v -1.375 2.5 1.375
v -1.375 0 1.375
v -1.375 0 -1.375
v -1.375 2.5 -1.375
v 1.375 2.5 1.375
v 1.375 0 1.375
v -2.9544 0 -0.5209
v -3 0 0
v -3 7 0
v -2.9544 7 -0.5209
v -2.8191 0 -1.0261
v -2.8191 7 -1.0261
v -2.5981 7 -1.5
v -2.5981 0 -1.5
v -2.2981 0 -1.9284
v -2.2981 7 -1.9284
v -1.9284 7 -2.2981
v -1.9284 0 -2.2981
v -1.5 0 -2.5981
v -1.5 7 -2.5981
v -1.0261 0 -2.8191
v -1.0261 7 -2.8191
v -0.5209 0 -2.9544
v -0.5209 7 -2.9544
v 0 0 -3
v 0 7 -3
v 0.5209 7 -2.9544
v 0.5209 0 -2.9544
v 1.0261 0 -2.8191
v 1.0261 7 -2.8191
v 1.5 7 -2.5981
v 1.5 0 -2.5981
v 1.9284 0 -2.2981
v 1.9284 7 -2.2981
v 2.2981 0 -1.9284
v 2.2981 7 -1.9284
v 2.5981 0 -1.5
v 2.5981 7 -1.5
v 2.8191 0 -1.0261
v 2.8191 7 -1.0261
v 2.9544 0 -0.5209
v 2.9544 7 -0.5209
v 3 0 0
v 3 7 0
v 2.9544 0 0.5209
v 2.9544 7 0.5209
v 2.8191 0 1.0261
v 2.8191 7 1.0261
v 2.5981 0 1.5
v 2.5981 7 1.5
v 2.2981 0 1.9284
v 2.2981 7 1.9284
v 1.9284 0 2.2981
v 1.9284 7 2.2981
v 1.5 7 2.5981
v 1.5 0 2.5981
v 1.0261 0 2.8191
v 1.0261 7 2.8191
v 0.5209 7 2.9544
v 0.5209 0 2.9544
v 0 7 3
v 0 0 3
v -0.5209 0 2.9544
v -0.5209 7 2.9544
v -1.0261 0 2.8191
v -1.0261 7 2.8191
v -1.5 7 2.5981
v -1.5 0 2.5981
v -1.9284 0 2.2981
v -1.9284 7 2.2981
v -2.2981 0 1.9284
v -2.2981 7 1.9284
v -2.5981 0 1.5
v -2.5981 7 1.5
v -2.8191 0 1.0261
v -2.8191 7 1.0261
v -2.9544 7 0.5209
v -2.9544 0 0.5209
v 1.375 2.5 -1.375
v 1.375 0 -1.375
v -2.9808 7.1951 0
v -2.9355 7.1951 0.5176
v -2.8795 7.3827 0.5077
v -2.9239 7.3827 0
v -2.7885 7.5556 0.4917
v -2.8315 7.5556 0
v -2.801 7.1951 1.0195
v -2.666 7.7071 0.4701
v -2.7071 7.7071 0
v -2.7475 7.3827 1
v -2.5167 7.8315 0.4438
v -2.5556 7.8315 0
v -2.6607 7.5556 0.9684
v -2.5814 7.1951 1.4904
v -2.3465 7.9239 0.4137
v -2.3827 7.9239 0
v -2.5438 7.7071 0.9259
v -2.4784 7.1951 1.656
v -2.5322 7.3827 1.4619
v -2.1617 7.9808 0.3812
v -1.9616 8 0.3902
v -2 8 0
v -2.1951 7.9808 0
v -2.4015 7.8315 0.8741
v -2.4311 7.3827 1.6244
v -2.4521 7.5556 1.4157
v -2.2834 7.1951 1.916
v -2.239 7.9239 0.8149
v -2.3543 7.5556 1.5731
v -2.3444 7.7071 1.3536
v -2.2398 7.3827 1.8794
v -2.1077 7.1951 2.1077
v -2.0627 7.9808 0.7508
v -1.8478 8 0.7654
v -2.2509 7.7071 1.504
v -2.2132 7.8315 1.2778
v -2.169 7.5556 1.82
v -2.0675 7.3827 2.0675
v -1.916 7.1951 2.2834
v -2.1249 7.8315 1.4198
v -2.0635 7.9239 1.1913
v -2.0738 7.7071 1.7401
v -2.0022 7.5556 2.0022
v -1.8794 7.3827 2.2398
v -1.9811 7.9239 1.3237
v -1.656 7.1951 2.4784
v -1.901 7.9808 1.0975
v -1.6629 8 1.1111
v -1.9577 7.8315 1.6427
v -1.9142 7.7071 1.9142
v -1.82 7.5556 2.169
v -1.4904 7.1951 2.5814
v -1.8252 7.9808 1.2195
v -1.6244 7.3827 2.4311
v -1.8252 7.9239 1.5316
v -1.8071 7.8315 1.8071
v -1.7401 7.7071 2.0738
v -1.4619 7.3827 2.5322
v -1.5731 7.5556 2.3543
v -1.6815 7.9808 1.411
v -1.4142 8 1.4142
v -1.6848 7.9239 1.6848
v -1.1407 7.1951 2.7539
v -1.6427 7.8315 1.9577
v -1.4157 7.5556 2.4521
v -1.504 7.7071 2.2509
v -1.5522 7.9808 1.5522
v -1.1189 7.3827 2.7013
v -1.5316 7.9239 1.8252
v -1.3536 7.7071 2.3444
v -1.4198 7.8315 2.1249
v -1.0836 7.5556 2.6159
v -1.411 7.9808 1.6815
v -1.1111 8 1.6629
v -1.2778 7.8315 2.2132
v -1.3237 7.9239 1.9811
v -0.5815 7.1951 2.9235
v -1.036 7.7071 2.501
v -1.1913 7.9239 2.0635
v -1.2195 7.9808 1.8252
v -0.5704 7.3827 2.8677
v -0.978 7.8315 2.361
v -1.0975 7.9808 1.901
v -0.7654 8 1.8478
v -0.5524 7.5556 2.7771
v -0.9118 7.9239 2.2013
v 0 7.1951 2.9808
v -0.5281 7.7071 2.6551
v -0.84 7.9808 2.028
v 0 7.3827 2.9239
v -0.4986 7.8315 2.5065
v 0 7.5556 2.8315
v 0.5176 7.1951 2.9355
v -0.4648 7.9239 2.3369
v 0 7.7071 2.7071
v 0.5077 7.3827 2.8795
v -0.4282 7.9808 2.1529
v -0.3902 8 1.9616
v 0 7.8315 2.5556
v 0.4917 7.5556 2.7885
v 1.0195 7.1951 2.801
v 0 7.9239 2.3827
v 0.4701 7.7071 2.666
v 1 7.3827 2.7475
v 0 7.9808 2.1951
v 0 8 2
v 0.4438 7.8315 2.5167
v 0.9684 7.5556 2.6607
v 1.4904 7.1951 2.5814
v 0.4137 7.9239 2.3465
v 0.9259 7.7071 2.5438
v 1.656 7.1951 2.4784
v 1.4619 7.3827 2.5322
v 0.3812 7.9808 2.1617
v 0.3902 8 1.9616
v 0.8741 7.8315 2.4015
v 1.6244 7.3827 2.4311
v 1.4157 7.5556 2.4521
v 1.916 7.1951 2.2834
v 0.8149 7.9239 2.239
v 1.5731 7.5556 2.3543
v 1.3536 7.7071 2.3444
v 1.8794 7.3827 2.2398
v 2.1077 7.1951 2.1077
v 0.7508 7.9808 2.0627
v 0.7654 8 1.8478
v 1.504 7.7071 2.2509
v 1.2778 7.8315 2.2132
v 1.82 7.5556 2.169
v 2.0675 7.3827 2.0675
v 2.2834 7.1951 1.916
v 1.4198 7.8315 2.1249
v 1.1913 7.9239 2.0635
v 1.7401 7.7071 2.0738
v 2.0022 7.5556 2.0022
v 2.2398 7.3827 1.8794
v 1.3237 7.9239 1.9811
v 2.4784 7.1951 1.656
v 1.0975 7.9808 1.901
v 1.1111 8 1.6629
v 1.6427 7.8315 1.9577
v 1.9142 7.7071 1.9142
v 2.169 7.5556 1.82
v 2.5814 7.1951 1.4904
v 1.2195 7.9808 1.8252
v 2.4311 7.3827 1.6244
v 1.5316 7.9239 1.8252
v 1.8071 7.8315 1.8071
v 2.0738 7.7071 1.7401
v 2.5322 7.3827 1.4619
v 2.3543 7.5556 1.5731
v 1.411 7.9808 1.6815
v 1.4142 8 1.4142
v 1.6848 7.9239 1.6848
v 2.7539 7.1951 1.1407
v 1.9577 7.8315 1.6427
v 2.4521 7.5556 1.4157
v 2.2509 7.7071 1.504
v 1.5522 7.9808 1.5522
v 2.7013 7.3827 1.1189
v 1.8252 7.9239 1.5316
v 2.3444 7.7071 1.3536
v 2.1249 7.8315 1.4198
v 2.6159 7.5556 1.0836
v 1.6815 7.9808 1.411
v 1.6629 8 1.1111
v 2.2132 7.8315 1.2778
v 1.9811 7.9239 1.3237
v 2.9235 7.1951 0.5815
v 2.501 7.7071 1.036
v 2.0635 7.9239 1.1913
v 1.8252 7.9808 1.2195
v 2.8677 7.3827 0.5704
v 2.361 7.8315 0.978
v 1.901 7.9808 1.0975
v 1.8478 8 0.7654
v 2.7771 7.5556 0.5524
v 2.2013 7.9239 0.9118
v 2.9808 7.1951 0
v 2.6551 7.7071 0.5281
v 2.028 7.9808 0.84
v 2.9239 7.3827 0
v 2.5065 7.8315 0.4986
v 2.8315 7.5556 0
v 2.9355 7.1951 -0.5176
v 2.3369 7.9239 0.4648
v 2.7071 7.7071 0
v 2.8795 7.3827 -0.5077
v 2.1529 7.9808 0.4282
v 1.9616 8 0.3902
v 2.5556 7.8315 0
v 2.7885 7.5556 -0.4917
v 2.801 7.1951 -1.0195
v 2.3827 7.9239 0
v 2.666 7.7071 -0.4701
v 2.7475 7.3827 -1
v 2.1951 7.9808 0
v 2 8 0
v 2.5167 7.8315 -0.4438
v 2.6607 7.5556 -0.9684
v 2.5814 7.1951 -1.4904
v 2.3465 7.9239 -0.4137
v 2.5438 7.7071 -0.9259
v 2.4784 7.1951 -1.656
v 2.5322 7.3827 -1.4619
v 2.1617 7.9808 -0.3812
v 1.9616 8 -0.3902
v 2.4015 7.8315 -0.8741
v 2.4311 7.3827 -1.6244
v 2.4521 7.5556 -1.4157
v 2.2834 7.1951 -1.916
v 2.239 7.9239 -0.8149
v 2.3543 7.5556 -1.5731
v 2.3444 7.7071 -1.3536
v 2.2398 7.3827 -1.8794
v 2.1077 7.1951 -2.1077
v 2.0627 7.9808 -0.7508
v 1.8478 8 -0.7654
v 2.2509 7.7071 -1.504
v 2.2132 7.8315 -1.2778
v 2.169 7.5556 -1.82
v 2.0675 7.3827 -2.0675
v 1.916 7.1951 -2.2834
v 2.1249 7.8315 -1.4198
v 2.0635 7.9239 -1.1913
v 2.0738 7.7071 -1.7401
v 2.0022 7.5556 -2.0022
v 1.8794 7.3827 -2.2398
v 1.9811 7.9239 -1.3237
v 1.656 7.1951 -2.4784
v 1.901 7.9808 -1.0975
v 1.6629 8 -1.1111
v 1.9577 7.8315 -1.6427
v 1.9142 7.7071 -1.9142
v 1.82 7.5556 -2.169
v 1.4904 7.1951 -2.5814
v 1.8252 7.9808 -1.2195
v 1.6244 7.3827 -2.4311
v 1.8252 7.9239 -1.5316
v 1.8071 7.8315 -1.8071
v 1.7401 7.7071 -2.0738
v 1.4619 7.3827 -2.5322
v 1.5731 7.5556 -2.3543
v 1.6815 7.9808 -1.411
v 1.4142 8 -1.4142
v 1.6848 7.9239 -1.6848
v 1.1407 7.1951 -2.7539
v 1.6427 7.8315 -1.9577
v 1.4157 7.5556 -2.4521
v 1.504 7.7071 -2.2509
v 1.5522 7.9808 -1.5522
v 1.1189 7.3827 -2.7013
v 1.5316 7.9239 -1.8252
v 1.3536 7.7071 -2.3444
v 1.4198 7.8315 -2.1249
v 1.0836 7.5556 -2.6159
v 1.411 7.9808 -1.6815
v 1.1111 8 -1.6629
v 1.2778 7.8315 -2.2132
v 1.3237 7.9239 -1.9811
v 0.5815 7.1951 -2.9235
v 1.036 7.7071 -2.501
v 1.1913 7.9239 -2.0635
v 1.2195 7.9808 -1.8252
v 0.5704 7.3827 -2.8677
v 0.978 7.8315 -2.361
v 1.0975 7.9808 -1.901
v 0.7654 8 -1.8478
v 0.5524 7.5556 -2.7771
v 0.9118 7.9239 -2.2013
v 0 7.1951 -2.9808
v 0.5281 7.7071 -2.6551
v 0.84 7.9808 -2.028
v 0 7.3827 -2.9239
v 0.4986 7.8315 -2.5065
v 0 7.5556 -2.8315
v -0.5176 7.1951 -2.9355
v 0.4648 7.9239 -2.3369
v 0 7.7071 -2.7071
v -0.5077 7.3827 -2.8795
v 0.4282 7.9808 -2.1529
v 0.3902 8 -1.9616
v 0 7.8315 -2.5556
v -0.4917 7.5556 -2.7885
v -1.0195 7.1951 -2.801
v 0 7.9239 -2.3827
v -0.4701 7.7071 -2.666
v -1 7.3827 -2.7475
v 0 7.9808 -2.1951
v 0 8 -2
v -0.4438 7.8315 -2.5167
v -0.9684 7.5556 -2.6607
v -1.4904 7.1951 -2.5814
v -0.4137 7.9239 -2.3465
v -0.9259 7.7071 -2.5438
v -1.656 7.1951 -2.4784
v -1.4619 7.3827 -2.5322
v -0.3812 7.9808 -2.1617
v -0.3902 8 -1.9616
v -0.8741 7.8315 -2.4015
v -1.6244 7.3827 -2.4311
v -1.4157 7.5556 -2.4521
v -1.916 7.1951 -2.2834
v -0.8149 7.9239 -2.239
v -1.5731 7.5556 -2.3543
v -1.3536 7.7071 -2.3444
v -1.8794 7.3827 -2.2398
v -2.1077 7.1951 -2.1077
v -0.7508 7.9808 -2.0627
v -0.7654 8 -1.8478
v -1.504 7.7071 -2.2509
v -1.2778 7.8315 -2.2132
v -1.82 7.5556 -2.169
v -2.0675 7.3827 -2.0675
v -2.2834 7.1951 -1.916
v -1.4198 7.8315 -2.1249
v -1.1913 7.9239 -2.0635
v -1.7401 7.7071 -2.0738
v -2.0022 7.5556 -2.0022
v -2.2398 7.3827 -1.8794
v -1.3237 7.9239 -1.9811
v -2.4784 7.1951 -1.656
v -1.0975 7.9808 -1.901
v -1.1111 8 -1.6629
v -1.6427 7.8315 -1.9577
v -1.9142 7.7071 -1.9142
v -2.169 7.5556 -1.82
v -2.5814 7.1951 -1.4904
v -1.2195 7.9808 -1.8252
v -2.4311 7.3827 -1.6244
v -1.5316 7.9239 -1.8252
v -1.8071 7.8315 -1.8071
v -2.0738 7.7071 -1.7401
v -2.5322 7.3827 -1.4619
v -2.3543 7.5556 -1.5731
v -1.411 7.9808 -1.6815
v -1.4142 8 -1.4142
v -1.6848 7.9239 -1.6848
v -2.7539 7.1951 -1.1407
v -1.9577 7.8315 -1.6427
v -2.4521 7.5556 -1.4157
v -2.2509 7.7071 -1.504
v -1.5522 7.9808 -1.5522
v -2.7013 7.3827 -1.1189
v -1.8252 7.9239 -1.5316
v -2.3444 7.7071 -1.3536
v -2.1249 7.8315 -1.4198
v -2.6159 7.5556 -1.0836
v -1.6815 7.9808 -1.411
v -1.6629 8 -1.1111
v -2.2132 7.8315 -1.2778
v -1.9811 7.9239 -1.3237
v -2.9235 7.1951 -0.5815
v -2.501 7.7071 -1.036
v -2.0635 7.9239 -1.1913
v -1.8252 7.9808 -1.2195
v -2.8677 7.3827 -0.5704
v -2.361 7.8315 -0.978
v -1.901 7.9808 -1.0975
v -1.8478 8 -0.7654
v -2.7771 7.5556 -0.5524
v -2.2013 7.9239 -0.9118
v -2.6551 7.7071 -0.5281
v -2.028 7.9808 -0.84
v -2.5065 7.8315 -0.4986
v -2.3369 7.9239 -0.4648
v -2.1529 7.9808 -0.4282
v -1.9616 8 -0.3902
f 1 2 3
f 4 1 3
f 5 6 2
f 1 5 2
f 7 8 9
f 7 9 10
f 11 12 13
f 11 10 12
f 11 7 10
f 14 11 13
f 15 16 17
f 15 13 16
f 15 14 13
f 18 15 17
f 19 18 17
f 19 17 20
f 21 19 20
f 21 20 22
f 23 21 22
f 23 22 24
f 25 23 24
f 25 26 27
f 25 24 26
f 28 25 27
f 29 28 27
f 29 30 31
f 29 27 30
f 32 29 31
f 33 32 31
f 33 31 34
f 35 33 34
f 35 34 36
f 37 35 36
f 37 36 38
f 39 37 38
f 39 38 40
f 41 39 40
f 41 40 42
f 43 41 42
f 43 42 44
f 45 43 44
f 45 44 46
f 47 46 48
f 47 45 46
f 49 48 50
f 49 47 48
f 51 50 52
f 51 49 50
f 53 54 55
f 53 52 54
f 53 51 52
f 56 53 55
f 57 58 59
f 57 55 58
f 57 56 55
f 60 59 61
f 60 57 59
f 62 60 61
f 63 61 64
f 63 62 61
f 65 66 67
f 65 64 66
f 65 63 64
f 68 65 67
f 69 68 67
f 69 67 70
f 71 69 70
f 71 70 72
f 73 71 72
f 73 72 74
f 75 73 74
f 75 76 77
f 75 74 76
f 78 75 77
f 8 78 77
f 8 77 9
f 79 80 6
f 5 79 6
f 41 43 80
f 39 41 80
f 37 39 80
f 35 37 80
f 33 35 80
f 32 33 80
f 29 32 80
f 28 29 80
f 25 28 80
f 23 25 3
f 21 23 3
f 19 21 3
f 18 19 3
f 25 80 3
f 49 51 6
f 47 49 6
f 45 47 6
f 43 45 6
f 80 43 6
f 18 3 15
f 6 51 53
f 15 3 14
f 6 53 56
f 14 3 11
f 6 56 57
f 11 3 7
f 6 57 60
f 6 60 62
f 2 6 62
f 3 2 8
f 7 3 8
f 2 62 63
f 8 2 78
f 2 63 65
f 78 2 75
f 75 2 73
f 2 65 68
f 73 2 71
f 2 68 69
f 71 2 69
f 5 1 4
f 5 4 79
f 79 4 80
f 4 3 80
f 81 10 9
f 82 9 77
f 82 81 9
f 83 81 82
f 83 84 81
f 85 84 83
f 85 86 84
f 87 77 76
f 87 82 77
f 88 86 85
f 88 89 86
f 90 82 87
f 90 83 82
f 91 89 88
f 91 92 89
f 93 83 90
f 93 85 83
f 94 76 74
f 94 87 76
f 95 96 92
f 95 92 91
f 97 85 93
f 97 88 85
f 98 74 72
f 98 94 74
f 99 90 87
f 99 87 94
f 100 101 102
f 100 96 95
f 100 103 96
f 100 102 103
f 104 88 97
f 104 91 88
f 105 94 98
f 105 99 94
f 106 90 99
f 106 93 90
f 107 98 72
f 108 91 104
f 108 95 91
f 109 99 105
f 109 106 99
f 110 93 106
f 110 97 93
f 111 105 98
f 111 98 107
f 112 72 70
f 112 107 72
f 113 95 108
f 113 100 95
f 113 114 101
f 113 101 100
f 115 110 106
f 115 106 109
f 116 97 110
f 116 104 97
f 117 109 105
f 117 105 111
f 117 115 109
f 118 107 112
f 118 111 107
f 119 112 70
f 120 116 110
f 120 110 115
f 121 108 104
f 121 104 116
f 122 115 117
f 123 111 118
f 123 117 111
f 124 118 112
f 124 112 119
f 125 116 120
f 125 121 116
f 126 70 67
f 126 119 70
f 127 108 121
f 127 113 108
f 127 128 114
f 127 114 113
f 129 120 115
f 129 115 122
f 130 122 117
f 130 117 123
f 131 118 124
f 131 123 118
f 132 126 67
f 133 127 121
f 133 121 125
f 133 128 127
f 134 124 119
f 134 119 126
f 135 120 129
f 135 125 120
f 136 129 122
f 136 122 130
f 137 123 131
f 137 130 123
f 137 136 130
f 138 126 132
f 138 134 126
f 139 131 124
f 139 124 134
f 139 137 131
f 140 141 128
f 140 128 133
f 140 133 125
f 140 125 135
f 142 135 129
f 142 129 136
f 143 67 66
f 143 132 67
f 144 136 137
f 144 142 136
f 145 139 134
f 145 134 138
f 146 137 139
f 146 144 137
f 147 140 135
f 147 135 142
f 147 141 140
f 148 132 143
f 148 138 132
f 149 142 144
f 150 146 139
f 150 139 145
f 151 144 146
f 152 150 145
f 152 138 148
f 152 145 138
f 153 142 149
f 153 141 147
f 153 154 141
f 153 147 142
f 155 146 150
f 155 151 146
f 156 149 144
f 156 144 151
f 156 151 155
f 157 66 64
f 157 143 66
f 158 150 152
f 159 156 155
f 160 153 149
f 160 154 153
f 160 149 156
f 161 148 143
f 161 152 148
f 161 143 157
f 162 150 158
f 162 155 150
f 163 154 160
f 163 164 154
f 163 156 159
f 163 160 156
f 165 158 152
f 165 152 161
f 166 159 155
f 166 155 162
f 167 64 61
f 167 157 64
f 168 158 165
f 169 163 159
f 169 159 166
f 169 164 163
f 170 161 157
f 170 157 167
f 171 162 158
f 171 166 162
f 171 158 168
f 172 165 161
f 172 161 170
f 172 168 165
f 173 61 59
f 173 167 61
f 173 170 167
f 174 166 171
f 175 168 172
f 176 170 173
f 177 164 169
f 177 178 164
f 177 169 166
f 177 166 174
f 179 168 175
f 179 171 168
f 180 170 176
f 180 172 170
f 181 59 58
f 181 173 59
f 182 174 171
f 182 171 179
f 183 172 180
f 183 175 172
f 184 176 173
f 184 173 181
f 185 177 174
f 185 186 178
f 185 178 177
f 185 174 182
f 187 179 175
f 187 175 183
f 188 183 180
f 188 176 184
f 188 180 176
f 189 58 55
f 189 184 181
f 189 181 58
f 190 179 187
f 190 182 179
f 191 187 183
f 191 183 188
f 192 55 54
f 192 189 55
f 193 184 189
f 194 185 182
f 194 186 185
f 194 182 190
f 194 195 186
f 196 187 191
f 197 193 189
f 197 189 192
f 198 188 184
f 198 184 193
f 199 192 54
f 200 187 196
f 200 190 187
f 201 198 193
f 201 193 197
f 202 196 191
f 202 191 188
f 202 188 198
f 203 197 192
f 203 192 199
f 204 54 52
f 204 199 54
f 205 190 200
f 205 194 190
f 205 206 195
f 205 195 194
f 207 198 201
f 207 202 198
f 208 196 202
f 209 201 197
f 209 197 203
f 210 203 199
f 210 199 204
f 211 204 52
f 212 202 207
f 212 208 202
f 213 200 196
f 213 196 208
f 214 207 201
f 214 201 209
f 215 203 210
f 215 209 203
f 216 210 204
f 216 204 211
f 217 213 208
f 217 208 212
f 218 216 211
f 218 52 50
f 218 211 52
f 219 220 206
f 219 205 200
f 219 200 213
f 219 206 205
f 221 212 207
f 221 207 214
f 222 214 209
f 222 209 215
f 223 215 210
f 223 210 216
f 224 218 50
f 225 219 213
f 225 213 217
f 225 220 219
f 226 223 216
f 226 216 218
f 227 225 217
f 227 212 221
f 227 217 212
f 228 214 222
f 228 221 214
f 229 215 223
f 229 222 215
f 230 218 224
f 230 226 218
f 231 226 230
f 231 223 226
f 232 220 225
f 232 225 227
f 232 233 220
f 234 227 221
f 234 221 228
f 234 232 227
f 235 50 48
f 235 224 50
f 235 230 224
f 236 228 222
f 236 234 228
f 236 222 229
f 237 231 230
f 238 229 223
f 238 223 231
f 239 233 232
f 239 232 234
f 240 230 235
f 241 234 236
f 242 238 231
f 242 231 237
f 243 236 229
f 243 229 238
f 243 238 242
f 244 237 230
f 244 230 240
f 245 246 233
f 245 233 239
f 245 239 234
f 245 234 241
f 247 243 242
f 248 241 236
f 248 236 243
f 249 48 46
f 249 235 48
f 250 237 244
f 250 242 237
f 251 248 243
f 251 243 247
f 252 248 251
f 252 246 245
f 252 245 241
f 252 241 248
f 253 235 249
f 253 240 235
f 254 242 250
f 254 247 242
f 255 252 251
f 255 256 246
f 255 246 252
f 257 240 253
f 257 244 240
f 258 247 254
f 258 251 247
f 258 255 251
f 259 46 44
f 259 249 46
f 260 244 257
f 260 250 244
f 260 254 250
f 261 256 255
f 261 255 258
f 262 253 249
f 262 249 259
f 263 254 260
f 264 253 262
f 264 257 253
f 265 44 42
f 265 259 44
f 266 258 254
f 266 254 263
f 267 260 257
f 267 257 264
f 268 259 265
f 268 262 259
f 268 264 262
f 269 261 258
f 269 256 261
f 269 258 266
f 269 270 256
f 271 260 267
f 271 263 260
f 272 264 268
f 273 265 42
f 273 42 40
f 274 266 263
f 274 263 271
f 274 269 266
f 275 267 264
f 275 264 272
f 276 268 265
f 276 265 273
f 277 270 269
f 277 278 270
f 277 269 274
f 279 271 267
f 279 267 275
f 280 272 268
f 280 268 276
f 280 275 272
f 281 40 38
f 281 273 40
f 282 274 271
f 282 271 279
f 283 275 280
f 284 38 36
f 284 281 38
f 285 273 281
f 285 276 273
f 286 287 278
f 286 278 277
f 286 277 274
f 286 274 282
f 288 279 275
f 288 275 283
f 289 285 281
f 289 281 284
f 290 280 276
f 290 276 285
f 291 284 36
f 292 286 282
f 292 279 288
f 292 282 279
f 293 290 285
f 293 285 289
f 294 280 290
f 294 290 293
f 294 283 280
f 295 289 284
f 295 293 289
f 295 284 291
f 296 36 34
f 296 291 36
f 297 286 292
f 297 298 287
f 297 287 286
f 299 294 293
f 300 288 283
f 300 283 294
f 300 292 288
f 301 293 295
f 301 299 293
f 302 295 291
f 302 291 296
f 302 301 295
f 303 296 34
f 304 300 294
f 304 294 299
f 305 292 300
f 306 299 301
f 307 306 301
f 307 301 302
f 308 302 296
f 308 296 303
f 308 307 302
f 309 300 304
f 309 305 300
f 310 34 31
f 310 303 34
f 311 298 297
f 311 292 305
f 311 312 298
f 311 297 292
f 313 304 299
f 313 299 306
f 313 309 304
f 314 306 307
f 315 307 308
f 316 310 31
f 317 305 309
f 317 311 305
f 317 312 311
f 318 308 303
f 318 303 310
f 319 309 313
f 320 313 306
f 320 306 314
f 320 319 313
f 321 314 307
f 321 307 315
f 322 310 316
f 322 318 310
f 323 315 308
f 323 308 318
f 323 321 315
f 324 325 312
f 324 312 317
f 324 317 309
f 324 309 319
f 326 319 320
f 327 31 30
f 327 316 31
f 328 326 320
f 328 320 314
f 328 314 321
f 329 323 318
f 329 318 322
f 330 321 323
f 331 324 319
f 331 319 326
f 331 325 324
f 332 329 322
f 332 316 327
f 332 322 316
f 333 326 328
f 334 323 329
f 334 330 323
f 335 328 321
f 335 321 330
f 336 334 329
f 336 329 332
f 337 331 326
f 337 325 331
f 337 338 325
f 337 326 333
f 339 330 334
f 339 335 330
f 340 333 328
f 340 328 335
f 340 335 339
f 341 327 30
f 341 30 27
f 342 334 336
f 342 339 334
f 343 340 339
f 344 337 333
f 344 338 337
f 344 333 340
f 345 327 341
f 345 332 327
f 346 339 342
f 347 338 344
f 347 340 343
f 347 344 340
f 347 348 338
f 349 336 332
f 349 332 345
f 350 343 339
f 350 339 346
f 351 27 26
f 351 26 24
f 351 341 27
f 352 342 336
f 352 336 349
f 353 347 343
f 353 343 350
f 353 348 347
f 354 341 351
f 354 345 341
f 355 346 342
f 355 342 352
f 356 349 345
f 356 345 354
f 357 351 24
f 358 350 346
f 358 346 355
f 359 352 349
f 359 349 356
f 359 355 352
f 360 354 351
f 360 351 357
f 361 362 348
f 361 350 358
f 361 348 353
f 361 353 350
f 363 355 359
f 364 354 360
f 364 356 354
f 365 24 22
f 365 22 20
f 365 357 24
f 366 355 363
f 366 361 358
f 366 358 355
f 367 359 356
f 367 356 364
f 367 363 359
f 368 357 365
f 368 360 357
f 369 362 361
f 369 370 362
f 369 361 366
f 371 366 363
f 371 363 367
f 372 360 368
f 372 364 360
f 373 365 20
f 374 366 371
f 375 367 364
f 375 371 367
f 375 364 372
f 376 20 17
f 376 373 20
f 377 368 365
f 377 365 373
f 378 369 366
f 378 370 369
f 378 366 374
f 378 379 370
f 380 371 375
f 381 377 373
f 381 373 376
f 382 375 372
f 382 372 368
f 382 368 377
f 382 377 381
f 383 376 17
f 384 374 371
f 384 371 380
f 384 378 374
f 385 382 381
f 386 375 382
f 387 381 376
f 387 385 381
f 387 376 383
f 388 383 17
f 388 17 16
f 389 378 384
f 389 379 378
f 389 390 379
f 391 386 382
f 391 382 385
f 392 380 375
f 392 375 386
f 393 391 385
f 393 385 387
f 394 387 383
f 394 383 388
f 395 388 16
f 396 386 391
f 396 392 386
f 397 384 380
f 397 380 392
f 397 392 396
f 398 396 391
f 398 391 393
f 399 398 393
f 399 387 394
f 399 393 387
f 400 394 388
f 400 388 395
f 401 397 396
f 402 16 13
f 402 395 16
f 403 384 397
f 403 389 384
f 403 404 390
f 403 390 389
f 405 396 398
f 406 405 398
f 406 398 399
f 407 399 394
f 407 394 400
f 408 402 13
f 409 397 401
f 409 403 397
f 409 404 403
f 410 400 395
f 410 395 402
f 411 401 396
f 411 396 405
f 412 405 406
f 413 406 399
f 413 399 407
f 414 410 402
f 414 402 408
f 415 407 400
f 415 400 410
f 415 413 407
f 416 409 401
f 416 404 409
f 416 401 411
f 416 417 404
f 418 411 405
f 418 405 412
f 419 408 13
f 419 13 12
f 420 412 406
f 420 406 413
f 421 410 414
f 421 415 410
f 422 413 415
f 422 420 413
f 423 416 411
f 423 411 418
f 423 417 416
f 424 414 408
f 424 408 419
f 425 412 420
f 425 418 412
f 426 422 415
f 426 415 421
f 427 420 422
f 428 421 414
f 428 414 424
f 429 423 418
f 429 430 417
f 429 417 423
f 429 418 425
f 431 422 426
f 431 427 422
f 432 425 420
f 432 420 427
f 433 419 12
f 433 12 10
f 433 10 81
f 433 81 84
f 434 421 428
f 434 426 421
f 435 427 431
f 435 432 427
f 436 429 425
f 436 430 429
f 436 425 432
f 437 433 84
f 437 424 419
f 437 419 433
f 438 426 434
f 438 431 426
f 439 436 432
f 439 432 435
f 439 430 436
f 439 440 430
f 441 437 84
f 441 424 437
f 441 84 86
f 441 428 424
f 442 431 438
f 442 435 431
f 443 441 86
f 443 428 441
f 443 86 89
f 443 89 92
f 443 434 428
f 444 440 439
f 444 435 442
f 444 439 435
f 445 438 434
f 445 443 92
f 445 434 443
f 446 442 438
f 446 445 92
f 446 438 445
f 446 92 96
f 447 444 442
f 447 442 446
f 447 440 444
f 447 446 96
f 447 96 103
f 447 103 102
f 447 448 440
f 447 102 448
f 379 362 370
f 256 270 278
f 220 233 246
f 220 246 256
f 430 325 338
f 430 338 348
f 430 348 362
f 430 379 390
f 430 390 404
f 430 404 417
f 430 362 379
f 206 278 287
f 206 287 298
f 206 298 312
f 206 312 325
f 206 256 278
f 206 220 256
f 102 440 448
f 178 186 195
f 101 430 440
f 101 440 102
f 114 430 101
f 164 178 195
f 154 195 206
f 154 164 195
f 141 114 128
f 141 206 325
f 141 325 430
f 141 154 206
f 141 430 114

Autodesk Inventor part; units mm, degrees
ref_plane "YZ Plane" through (0, 0, 0) normal (1, 0, 0) x (0, 1, 0)
ref_plane "XZ Plane" through (0, 0, 0) normal (0, 1, 0) x (-1, 0, 0)
ref_plane "XY Plane" through (0, 0, 0) normal (0, 0, 1) x (1, 0, 0)
sketch "Sketch1" plane through (0, 0, 0) normal (0, 1, 0) x (-1, 0, 0)
  circle A0 centre (0, 0) radius 3
  dimension "d0" = 6
extrude "Extrusion1" add sketch "Sketch1" along normal blind 8
sketch "Sketch2" plane through (0, 0, 0) normal (0, -1, 0) x (1, 0, 0)
  line L0 (-1.375, -1.375) -> (1.375, -1.375)
  line L1 (1.375, -1.375) -> (1.375, 1.375)
  line L2 (1.375, 1.375) -> (-1.375, 1.375)
  line L3 (-1.375, 1.375) -> (-1.375, -1.375)
  line L4 (-1.375, -1.375) -> (1.375, 1.375) construction
  line L5 (1.375, -1.375) -> (-1.375, 1.375) construction
  point P0 (0, 0)
  dimension "d3" = 2.75
  dimension "d4" = 2.75
extrude "Extrusion2" cut sketch "Sketch2" against normal blind 2.5
fillet "Fillet1" radius 1 1 edges at (3, 8, 0)
properties part number "Button"
